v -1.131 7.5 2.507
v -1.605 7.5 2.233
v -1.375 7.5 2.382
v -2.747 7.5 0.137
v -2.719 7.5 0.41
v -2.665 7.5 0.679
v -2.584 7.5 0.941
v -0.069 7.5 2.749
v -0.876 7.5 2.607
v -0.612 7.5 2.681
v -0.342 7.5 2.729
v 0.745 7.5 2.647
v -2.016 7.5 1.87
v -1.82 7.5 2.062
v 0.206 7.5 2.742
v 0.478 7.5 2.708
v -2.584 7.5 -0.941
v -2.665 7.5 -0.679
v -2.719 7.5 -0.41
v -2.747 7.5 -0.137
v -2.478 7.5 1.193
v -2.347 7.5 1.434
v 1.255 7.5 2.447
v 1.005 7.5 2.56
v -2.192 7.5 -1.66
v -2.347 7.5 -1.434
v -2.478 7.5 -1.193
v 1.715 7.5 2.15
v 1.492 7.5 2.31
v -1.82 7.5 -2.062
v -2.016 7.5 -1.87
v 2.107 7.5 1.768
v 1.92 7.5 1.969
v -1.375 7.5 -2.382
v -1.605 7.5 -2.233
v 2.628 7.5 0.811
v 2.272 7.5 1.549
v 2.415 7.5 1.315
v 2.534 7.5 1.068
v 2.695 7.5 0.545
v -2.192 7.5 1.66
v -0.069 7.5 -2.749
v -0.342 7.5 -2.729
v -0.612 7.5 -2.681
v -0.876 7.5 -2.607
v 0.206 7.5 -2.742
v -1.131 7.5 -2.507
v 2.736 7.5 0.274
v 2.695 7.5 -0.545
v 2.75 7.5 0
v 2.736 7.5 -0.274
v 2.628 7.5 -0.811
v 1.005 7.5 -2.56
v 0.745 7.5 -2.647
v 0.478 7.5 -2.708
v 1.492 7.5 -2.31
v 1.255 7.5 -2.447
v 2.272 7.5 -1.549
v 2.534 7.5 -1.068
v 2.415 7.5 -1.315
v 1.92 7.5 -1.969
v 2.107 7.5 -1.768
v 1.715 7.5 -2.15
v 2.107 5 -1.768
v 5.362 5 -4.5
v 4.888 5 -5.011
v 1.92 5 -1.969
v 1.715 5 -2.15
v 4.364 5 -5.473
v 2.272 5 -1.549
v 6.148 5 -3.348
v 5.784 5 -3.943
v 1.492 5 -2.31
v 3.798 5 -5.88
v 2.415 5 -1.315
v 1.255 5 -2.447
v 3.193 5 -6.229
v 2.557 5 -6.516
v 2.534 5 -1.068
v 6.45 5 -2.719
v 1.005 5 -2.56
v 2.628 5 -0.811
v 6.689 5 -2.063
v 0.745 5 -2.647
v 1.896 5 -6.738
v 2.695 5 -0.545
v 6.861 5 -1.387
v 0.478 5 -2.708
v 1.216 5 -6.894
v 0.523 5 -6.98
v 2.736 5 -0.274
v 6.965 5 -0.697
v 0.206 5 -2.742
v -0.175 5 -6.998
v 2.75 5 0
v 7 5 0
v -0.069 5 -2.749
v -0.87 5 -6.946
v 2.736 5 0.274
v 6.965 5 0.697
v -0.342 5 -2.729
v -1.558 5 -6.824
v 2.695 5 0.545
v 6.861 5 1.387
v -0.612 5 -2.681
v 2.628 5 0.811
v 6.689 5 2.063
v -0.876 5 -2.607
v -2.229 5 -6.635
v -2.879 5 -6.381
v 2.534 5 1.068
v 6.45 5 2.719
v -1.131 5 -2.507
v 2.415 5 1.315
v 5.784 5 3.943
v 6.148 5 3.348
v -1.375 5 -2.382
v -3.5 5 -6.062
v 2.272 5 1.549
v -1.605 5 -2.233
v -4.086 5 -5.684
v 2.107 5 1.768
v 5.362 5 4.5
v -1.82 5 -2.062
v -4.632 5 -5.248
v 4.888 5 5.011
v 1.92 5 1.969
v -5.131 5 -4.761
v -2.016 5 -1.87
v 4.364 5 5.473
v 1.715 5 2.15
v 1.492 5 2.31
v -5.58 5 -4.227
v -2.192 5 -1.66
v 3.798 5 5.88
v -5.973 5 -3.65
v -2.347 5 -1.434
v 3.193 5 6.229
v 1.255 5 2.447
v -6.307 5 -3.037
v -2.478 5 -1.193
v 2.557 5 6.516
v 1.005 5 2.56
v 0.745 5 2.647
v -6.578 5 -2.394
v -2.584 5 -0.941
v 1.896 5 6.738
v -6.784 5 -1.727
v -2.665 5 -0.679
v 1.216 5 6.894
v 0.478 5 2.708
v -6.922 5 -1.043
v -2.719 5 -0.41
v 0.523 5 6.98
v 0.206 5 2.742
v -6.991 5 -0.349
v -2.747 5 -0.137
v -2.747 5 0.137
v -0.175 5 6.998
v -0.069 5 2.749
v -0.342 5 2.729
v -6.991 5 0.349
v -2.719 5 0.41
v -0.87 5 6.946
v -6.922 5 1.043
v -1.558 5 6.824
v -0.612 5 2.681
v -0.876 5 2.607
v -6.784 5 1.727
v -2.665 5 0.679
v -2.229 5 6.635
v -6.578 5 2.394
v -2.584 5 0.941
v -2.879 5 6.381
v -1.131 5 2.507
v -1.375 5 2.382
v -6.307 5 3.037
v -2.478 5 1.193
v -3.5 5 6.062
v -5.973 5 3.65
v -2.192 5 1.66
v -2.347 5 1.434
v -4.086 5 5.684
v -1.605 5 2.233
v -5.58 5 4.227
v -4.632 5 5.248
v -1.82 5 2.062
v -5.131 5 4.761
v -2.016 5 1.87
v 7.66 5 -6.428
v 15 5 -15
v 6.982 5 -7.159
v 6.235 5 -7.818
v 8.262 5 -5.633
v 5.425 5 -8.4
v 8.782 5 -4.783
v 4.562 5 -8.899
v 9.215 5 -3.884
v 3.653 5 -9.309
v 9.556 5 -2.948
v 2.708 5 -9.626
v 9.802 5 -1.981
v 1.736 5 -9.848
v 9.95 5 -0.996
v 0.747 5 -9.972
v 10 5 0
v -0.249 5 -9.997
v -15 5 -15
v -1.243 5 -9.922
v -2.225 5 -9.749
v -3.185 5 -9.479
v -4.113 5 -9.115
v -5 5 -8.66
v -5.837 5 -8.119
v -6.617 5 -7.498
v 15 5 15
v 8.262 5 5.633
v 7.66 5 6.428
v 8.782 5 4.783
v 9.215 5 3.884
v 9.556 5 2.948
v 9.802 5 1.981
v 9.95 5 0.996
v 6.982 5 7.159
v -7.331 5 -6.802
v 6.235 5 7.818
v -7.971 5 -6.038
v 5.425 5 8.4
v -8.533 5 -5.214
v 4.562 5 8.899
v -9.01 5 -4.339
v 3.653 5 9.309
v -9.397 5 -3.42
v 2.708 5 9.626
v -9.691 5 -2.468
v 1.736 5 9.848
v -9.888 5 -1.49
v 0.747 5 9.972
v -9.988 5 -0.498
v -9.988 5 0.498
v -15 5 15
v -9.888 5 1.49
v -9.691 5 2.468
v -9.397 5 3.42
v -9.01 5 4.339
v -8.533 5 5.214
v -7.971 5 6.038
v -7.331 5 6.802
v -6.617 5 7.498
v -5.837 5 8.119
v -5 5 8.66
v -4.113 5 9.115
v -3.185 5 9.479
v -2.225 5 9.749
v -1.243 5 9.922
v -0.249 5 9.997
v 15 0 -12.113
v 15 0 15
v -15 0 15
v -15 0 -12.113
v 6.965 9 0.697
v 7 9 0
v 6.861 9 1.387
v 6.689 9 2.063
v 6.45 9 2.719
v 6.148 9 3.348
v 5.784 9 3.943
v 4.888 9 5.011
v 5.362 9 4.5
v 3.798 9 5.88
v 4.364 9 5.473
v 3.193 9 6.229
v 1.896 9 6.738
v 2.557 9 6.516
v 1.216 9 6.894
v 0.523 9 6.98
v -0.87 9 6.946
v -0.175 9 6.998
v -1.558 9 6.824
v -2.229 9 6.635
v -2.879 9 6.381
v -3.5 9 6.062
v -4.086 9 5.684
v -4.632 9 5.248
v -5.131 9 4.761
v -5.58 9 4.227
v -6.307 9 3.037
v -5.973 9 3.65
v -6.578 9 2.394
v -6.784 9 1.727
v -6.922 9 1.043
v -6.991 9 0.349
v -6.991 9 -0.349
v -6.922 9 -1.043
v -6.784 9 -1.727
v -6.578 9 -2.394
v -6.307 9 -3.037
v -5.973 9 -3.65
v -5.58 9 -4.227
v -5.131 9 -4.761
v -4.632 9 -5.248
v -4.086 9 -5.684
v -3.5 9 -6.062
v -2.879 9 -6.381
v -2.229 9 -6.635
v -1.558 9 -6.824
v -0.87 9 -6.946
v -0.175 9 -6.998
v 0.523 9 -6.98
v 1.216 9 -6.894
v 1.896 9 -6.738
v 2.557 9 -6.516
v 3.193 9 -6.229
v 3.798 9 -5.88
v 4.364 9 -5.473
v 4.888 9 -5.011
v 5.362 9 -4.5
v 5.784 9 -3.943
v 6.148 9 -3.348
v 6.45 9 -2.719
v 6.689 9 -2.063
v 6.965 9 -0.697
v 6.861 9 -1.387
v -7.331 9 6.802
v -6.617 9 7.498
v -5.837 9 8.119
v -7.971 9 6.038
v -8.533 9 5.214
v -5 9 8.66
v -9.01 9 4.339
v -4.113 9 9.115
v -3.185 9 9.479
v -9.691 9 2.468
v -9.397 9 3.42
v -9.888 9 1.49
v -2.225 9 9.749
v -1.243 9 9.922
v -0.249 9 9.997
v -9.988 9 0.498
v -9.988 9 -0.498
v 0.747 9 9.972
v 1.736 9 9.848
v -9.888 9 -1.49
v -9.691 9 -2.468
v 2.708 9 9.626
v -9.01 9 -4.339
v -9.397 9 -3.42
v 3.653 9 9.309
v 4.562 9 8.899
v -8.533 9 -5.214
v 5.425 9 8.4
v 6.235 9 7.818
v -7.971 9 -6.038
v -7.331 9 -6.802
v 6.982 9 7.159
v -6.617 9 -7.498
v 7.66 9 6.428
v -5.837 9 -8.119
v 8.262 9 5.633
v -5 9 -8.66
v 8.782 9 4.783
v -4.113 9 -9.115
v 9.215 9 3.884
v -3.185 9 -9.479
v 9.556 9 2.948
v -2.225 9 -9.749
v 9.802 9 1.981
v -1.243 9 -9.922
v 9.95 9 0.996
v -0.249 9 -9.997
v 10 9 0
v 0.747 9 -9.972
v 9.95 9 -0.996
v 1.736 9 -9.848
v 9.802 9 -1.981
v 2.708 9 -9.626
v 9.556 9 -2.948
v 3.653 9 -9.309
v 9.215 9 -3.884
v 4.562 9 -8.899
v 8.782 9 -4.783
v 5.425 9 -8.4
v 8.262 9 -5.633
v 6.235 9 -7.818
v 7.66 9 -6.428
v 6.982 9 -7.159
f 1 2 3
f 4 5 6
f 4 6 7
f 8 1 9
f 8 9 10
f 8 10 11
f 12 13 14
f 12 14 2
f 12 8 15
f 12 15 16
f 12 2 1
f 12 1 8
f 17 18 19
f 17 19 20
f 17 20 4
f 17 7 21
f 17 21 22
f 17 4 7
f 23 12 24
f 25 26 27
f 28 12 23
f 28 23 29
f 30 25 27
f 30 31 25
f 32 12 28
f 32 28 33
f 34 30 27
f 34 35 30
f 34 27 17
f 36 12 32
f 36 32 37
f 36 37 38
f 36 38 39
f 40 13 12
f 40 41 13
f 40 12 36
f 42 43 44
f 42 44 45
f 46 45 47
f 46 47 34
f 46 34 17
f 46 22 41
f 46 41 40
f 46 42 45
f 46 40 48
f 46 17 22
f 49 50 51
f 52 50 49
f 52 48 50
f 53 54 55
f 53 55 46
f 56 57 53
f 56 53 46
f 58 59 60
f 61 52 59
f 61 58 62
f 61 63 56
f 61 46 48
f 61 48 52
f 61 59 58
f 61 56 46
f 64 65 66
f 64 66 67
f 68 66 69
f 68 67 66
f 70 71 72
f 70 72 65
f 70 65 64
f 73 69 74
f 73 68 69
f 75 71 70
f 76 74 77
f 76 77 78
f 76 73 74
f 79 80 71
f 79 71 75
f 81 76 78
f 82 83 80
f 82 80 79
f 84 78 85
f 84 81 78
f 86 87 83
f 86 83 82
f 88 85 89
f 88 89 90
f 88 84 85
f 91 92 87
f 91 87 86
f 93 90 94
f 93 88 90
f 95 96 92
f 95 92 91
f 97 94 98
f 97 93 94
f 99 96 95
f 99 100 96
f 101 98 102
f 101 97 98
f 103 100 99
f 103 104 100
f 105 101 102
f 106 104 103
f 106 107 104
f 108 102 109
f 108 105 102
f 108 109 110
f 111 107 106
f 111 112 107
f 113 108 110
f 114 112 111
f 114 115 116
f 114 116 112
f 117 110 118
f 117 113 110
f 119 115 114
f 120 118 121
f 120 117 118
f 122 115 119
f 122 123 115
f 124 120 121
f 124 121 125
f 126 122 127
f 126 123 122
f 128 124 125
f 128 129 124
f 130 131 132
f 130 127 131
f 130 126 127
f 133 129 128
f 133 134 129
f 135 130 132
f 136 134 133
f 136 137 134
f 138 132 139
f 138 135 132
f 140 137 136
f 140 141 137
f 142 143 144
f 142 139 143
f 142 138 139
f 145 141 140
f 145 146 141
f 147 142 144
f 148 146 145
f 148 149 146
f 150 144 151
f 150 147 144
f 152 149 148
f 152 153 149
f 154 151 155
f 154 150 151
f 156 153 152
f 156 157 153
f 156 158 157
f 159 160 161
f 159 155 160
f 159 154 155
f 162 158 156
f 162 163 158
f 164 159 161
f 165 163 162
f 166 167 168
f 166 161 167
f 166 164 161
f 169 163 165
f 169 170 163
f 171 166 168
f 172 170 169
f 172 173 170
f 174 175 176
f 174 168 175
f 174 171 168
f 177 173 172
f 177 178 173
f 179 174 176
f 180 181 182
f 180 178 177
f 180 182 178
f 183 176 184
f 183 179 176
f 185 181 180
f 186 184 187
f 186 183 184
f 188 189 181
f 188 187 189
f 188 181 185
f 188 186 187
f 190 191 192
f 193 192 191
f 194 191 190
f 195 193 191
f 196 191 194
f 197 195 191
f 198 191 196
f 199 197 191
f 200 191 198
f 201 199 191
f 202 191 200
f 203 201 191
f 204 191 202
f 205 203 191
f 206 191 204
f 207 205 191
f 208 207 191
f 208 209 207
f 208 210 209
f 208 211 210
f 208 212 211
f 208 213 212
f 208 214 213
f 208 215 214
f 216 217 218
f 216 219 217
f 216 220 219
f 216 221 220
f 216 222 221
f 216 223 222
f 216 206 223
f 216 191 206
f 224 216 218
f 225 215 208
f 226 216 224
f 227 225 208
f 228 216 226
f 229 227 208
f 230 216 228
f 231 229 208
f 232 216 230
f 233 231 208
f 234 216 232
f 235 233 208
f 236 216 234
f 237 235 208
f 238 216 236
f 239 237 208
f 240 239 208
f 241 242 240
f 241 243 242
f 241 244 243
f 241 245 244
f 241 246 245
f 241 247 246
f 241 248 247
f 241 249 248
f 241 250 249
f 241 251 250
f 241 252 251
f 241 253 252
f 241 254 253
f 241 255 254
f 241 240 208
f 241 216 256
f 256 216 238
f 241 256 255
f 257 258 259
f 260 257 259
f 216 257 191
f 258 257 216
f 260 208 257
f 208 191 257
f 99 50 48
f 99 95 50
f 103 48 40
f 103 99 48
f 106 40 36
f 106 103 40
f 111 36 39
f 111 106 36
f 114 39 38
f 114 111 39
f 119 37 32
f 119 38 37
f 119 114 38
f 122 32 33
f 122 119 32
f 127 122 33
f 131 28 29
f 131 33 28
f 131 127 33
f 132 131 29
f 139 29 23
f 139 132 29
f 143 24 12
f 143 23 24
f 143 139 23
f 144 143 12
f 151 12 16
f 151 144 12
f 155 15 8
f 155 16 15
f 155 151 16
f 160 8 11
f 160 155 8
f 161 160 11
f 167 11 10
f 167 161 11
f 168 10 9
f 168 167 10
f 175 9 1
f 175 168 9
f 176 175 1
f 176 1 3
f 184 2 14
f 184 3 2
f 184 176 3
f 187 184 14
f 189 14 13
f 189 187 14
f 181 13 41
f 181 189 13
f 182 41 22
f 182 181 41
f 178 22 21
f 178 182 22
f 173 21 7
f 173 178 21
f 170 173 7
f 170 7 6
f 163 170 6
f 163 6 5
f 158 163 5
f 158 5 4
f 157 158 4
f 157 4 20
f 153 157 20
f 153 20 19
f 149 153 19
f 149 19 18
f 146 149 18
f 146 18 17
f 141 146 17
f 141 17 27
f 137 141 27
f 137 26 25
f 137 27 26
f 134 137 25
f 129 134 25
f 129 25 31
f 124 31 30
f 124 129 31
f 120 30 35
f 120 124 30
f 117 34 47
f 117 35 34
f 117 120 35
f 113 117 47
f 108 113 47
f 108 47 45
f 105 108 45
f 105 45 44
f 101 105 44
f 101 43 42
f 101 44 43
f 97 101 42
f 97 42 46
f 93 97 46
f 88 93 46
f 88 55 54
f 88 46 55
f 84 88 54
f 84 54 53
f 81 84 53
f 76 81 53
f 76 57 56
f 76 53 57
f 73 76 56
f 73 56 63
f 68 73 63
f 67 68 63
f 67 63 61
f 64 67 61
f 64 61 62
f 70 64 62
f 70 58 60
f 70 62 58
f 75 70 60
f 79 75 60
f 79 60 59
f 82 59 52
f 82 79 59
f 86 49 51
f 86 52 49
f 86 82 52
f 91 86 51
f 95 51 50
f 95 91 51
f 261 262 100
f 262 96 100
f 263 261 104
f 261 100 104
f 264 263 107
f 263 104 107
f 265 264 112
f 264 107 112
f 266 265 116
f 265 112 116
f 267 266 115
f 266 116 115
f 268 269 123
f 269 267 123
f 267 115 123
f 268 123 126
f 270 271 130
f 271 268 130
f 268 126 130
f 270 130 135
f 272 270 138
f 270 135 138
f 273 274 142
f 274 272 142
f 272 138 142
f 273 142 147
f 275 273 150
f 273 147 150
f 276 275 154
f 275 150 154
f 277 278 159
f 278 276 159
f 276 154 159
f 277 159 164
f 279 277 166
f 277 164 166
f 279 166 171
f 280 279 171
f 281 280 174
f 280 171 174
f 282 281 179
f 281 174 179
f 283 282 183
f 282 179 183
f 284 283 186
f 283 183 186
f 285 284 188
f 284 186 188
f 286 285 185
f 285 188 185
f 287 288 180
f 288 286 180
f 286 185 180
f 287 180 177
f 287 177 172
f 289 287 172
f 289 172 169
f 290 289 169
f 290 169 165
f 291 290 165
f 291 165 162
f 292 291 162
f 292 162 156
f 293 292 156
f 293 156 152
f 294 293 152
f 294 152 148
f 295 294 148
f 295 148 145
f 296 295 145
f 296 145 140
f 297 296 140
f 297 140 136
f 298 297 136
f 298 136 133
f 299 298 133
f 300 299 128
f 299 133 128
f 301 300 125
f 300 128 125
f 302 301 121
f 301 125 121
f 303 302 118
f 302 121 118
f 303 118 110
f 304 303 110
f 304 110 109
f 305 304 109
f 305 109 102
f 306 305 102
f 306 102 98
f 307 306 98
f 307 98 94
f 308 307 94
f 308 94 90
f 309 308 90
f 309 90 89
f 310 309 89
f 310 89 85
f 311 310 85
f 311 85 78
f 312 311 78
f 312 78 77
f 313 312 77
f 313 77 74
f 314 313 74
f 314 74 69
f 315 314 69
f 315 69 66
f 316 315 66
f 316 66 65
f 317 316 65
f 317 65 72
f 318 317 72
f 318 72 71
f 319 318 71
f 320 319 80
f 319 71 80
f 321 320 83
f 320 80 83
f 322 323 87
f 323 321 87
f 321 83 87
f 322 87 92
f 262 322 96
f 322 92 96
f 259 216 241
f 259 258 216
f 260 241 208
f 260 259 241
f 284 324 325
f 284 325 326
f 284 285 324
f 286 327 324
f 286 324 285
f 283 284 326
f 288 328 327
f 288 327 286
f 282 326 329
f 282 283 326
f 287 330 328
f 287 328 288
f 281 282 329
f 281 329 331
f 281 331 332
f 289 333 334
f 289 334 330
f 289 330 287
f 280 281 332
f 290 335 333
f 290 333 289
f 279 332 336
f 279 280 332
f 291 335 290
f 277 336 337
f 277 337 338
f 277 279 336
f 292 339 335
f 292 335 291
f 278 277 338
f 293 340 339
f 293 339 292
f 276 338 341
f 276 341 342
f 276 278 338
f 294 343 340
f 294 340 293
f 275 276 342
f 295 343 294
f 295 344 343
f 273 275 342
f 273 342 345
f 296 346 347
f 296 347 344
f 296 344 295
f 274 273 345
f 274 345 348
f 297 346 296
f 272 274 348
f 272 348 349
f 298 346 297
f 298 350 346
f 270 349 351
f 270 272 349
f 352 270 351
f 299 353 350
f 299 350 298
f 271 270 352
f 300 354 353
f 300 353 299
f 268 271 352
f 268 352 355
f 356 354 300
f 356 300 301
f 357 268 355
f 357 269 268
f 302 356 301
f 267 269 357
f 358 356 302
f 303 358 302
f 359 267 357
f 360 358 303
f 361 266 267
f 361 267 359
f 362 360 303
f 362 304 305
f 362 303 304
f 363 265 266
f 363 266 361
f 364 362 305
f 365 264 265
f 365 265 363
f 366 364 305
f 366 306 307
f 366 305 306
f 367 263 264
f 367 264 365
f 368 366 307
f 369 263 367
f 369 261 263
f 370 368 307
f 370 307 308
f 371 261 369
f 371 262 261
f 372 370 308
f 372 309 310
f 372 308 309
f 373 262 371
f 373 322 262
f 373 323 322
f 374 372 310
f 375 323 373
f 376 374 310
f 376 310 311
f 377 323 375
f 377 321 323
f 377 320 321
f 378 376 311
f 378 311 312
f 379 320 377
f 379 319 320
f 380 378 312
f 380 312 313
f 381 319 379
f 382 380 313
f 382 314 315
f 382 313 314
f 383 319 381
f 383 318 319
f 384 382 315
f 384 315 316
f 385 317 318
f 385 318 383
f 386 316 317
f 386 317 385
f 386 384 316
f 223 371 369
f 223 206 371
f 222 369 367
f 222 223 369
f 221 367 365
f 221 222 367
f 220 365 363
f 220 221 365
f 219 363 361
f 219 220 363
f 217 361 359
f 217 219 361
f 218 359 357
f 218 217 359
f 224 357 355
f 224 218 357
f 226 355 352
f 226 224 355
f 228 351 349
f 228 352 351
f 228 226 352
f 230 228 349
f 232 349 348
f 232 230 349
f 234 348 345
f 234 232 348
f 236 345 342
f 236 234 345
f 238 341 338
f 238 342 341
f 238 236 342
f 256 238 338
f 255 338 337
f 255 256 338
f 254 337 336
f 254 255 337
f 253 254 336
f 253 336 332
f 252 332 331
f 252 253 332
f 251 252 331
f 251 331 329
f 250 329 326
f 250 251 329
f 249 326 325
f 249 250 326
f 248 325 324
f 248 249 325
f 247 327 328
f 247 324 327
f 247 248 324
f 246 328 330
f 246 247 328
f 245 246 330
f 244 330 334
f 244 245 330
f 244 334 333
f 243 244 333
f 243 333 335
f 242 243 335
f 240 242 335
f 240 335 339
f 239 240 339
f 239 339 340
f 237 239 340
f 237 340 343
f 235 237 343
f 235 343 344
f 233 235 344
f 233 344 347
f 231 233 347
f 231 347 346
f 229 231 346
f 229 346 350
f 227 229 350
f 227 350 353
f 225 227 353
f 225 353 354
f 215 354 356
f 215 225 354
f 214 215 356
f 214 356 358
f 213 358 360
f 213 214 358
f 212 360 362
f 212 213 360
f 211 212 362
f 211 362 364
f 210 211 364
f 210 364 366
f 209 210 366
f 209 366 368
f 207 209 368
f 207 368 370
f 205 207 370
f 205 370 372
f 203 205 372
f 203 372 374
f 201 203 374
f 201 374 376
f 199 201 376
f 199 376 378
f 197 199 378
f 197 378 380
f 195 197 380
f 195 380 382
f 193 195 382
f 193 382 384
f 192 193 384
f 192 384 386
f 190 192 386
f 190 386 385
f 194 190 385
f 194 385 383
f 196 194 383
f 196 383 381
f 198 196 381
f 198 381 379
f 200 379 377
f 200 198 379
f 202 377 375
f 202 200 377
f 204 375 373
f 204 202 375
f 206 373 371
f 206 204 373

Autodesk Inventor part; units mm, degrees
ref_plane "YZ Plane" through (0, 0, 0) normal (1, 0, 0) x (0, 1, 0)
ref_plane "XZ Plane" through (0, 0, 0) normal (0, 1, 0) x (-1, 0, 0)
ref_plane "XY Plane" through (0, 0, 0) normal (0, 0, 1) x (1, 0, 0)
sketch "Sketch1" plane through (0, 0, 0) normal (0, 1, 0) x (-1, 0, 0)
  line L0 (-15, 15) -> (15, 15)
  line L1 (15, 15) -> (15, -15)
  line L2 (15, -15) -> (-15, -15)
  line L3 (-15, -15) -> (-15, 15)
  line L4 (-15, 15) -> (15, -15) construction
  line L5 (15, 15) -> (-15, -15) construction
  point P0 (0, 0)
  dimension "d0" = 30
  dimension "d1" = 30
extrude "Extrusion1" add sketch "Sketch1" along normal blind 5
sketch "Sketch2" plane through (0, 5, 0) normal (0, 1, 0) x (1, 0, 0)
  circle A0 centre (0, 0) radius 2.75
  dimension "d4" = 5.5
extrude "Extrusion2" add sketch "Sketch2" along normal blind 2.5
sketch "Sketch3" plane through (0, 5, 0) normal (0, 1, 0) x (1, 0, 0)
  circle A0 centre (0, 0) radius 7
  circle A1 centre (0, 0) radius 10
  dimension "d7" = 14
  dimension "d8" = 20
extrude "Extrusion3" add sketch "Sketch3" along normal blind 4
sketch "Sketch4" plane through (15, 0, 15) normal (1, 0, 0) x (0, 0, -1)
  line L0 (30, 5) -> (0, 5) projected
  line L1 (30, 0) -> (30, 5) projected
  line L2 (30, 5) -> (27.1132, 0)
  line L3 (30, 5) -> (39.3023, 5) construction
  line L4 (30, 0) -> (0, 0) projected
  line L5 (27.1132, 0) -> (30, 0)
  line L6 (30, 0) -> (30, 5)
  point P0 (15, 0)
  dimension "d12" = 120
extrude "Extrusion4" cut sketch "Sketch4" against normal blind 30
properties part number "thumb_mount"
